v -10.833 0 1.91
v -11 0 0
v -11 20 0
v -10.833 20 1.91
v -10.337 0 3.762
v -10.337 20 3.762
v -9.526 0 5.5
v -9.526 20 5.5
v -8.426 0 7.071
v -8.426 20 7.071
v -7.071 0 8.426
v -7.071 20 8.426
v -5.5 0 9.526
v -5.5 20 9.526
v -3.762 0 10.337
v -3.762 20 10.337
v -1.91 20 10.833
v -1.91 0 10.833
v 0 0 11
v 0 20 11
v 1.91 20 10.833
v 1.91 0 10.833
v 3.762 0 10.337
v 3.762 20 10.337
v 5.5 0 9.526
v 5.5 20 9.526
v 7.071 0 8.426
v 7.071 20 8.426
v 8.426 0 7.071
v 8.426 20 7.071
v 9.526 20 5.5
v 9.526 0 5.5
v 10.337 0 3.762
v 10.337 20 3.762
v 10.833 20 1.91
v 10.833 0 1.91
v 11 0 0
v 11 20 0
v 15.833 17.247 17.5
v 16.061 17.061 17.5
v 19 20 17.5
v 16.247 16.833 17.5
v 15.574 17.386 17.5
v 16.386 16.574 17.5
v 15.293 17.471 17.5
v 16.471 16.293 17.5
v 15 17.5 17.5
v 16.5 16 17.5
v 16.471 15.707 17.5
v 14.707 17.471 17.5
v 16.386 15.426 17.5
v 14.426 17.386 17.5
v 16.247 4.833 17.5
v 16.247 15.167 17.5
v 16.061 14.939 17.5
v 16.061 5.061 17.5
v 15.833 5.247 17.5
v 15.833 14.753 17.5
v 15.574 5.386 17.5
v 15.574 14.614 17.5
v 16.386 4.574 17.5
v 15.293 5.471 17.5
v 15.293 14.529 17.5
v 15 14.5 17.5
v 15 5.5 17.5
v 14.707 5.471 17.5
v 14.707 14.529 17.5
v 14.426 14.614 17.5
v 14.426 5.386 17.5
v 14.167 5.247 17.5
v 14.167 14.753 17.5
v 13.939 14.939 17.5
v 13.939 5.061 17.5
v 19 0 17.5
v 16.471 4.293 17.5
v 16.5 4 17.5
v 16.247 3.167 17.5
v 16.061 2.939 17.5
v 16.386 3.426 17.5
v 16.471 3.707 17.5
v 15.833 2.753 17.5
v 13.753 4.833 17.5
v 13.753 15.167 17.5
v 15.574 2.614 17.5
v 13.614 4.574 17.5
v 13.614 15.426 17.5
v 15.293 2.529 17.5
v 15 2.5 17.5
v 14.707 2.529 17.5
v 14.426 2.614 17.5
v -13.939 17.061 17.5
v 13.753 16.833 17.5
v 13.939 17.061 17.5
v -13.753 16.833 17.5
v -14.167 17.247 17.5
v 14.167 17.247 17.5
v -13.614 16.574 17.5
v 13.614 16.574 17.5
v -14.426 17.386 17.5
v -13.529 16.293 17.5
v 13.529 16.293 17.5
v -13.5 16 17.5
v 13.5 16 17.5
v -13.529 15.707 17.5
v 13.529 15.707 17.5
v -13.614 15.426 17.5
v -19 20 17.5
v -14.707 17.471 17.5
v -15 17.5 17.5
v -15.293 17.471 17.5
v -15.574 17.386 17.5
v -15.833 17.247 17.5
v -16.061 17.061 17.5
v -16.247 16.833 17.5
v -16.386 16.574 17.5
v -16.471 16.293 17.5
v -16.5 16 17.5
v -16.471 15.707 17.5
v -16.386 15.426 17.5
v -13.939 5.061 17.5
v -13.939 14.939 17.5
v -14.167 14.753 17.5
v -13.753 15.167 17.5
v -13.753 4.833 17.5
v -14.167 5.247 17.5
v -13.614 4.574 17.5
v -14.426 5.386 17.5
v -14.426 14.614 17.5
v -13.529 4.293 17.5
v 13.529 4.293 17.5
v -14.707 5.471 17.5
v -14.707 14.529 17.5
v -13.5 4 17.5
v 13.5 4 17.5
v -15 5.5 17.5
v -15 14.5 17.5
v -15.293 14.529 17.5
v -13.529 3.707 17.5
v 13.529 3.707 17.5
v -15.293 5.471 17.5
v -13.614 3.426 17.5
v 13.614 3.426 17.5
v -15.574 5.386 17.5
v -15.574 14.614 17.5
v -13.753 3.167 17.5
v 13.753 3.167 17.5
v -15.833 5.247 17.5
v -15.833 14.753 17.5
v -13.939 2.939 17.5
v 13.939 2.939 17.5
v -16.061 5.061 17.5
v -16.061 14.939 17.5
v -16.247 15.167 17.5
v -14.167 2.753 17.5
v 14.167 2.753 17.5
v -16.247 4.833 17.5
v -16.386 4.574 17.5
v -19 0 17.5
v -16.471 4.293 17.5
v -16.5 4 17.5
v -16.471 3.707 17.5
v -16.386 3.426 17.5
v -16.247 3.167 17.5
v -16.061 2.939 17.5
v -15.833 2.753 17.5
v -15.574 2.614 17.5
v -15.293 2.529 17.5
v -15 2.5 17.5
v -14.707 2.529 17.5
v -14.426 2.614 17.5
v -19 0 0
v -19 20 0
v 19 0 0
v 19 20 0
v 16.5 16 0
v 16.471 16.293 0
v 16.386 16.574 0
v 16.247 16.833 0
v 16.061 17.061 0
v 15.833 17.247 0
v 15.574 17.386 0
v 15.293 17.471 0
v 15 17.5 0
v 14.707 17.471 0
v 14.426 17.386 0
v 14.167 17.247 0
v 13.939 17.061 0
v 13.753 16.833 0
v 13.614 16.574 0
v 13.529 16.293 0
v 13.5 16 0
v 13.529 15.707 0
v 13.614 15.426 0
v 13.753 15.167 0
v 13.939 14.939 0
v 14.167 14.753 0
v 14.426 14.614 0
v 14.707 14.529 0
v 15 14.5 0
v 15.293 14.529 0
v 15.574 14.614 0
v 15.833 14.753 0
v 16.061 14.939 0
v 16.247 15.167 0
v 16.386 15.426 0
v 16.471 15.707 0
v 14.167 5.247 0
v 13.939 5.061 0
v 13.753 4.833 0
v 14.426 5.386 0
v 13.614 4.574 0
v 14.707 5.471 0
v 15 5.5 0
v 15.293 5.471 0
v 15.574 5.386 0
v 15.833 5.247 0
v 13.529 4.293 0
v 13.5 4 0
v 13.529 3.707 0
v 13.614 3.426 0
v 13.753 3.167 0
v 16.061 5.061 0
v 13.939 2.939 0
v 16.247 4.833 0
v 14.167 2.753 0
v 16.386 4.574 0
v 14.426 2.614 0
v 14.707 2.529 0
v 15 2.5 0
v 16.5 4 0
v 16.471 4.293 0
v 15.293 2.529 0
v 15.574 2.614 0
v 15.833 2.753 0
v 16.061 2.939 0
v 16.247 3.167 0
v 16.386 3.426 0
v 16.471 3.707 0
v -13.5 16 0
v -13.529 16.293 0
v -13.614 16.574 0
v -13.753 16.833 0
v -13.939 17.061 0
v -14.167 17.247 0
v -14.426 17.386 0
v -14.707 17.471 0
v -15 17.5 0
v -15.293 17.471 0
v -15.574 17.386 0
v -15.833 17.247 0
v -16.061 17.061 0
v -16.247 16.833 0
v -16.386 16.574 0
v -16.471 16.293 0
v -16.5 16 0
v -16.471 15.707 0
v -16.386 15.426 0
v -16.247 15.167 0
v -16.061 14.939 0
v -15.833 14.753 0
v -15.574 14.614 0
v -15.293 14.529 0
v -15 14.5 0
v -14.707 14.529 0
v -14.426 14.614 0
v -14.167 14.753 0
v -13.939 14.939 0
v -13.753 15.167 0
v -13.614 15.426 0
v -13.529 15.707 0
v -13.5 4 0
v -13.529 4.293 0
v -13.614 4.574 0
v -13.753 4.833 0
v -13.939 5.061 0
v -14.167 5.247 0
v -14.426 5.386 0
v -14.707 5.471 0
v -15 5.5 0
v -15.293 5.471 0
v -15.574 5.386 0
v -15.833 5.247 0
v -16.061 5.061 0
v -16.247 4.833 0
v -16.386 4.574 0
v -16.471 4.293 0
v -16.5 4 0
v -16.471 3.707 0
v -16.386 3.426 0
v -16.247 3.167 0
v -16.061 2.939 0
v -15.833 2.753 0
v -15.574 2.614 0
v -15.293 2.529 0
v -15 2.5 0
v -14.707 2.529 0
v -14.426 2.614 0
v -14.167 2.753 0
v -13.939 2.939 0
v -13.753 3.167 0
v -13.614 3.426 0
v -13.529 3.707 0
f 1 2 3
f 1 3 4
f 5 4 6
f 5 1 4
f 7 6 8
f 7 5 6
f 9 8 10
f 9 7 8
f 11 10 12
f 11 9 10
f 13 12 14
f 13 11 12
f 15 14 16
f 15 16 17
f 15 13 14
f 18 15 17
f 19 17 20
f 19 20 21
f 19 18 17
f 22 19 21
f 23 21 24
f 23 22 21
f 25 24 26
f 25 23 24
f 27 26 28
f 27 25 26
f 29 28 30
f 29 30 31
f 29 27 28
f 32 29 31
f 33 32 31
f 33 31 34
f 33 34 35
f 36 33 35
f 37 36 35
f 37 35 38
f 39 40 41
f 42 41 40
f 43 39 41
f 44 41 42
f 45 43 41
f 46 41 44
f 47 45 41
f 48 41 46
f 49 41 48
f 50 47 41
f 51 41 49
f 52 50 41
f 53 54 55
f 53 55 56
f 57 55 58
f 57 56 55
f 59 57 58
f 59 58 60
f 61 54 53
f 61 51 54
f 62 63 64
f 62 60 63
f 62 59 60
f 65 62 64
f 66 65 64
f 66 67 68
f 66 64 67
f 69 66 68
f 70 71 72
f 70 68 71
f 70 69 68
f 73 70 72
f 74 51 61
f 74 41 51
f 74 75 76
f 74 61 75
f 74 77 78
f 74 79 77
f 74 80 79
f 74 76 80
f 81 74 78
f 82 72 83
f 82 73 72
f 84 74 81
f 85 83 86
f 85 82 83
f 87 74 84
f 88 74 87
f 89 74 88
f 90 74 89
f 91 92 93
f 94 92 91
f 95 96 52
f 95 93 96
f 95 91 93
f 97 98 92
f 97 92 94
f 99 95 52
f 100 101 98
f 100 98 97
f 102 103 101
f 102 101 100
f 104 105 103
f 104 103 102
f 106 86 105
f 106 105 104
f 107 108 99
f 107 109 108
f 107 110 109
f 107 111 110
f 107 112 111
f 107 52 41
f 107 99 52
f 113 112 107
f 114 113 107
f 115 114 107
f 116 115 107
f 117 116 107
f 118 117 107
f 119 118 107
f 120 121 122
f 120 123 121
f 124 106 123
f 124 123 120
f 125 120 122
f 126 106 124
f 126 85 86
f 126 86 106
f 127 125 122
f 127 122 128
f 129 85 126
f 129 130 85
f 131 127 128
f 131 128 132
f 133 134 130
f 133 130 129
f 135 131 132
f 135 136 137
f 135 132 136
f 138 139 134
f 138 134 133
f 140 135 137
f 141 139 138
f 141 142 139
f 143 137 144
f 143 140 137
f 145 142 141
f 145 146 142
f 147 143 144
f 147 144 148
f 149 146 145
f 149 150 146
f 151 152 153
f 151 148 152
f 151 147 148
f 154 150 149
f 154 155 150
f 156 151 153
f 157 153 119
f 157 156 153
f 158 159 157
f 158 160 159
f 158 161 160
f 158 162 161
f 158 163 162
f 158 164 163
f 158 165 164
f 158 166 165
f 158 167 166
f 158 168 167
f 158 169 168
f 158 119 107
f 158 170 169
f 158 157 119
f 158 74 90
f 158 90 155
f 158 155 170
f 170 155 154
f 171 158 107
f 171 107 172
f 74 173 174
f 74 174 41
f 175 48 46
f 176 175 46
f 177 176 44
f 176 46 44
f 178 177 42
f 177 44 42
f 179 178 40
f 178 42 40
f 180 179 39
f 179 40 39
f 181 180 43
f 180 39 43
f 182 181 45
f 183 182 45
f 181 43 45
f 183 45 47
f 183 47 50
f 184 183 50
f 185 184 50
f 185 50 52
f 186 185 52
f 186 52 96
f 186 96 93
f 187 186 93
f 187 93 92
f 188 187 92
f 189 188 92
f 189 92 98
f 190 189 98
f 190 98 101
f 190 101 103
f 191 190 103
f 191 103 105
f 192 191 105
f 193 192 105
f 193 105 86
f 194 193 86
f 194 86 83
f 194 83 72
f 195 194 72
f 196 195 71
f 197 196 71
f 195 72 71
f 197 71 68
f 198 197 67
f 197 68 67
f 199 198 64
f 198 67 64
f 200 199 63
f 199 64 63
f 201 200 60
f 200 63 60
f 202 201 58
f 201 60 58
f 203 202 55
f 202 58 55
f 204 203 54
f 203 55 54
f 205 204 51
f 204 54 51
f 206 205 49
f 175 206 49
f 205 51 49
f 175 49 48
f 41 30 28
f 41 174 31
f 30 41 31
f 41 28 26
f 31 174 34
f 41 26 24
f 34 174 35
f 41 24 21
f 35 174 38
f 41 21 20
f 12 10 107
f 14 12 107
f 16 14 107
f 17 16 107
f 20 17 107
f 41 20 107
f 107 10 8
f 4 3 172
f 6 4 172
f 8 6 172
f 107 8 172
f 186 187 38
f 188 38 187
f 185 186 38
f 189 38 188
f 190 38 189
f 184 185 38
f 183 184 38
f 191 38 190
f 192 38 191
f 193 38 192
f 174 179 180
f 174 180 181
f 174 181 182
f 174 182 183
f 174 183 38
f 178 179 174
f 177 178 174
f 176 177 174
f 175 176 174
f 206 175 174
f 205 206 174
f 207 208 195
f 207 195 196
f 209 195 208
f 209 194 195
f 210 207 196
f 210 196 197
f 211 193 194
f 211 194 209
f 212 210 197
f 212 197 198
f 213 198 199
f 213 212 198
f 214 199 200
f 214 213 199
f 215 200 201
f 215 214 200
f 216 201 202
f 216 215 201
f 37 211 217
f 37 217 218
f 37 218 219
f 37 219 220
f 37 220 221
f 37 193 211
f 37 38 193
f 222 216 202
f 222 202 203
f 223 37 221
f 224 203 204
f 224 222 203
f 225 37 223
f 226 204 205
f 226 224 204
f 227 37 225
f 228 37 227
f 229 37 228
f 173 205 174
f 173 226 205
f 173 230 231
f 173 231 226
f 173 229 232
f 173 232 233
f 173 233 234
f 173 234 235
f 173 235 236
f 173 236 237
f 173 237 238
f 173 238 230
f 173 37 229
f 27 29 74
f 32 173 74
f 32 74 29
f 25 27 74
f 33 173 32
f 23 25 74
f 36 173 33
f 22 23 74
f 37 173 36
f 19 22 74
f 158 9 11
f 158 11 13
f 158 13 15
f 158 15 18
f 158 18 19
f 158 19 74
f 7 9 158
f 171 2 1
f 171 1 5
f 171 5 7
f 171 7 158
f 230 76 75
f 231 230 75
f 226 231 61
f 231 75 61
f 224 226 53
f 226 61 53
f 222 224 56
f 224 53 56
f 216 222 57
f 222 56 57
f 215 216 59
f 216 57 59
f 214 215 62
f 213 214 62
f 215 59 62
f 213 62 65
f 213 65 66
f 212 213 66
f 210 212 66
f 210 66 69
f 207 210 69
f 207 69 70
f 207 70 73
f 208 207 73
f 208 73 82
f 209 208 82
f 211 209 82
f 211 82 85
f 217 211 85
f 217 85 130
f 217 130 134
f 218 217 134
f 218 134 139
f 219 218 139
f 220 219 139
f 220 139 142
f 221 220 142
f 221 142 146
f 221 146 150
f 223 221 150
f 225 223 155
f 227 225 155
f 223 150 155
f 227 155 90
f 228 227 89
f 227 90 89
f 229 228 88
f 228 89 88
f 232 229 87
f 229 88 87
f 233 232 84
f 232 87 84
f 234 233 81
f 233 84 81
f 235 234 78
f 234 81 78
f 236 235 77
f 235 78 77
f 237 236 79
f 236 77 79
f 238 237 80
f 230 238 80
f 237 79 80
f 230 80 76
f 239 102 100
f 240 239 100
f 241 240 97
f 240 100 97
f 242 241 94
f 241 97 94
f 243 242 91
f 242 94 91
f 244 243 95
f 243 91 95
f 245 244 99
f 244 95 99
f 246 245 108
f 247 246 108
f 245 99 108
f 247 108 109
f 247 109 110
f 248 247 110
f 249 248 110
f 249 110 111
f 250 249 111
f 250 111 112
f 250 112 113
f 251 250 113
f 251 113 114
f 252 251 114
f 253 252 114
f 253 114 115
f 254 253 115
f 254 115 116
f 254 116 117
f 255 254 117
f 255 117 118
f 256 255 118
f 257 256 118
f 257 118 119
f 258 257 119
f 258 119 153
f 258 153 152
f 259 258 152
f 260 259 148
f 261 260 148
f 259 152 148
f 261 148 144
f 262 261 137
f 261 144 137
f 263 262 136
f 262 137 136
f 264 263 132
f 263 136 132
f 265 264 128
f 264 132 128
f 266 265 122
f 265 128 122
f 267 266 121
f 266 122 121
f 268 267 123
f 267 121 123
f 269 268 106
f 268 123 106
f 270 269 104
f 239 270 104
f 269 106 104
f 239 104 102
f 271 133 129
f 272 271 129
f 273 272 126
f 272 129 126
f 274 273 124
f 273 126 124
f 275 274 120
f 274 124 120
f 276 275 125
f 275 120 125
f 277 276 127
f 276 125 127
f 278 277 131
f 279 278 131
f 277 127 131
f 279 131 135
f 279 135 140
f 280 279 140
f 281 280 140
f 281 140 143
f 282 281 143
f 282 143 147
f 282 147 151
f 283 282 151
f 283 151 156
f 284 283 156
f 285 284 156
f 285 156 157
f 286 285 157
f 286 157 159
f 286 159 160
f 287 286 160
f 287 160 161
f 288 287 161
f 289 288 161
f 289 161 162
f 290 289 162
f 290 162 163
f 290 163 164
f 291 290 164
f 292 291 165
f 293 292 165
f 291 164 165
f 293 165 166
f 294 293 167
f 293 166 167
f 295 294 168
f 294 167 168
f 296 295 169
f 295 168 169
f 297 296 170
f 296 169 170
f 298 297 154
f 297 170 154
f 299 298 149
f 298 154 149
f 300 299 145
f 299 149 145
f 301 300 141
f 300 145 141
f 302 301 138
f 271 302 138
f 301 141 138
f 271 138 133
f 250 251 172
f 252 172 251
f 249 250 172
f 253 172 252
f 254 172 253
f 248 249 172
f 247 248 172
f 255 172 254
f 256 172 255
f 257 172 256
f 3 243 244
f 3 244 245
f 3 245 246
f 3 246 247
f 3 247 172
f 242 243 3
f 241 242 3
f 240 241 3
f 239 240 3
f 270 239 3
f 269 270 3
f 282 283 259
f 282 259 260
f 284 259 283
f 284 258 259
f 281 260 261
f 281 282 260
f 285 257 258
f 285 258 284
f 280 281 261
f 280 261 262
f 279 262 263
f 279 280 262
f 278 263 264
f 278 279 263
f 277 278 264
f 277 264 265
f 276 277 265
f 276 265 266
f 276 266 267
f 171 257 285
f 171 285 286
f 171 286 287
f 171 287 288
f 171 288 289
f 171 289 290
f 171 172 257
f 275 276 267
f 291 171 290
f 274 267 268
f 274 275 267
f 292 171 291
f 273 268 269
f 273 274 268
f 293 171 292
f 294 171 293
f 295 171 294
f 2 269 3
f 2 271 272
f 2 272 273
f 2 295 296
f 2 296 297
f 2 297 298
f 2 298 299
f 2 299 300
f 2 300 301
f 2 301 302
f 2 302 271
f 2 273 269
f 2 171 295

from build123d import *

# Parameters (mm, degrees)
SALIENTE_EXTRUIR1_DEPTH = 20
CROQUIS2_R              = 1.5
CORTAR_EXTRUIR1_DEPTH   = 18.5


with BuildPart() as part:
    # Croquis1 → Saliente-Extruir1 (new body)
    with BuildSketch(Plane(origin=(0, 0, 0), x_dir=(1, 0, 0), z_dir=(0, 1, 0))):
        with BuildLine():
            Line((-19, 0), (-11, 0))
            ThreePointArc((-11, 0), (0, -11), (11, 0))
            Line((11, 0), (19, 0))
            Line((19, 0), (19, -17.5))
            Line((19, -17.5), (-19, -17.5))
            Line((-19, -17.5), (-19, 0))
        make_face()
    extrude(amount=SALIENTE_EXTRUIR1_DEPTH)

    # Croquis2 → Cortar-Extruir1 (cut, through all)
    with BuildSketch(Plane.XY.offset(17.5)):
        with Locations((-15, 16)):
            Circle(CROQUIS2_R)
        with Locations((-15, 4)):
            Circle(CROQUIS2_R)
        with Locations((15, 4)):
            Circle(CROQUIS2_R)
        with Locations((15, 16)):
            Circle(CROQUIS2_R)
    extrude(amount=-CORTAR_EXTRUIR1_DEPTH, mode=Mode.SUBTRACT)


solid = part.part
